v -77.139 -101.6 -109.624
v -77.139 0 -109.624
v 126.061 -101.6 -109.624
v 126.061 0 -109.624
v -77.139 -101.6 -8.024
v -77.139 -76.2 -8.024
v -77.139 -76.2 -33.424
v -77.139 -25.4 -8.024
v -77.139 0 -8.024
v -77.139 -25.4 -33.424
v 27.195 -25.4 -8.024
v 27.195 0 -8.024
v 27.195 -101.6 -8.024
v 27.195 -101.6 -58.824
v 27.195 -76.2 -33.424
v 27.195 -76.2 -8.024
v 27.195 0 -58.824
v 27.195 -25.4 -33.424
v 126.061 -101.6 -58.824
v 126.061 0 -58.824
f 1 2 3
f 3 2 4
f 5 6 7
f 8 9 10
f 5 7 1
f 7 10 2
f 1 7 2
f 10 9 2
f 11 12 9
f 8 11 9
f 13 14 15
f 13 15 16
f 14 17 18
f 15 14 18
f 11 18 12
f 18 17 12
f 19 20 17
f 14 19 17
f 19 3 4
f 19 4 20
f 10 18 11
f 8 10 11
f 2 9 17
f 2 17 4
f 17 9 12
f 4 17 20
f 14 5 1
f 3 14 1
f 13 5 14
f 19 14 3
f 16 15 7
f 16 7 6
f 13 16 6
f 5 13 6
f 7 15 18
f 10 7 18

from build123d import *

# Parameters (mm, degrees)
F1_DEPTH  = 101.6
F2_W      = 50.8
F2_H      = 25.4
F3_DEPTH  = 126.062407
F3_FACE_W = 50.8
F3_FACE_H = 25.4
F4_DEPTH  = 77.139593


with BuildPart() as f1:
    # F0 (on Front) → F1 (new body)
    with BuildSketch(Plane.XZ):
        Polygon((27.194744, -8.023955), (-77.138593, -8.023955), (-77.138593, -109.623955), (126.061407, -109.623955), (126.061407, -58.823955), (27.194744, -58.823955), align=None)
    extrude(amount=F1_DEPTH)

    # F2 (on Right) → F3 (cut, through all)
    with BuildSketch(Plane.YZ):
        with Locations((-50.8, -20.723955)):
            Rectangle(F2_W, F2_H)
    extrude(amount=F3_DEPTH, mode=Mode.SUBTRACT)

    # F3_face (on face) → F4 (cut, through all)
    with BuildSketch(Plane(origin=(0, -50.8, -20.723955), x_dir=(0, 1, 0), z_dir=(1, 0, 0))):
        Rectangle(F3_FACE_W, F3_FACE_H)
    extrude(amount=-F4_DEPTH, mode=Mode.SUBTRACT)


solid = f1.part
